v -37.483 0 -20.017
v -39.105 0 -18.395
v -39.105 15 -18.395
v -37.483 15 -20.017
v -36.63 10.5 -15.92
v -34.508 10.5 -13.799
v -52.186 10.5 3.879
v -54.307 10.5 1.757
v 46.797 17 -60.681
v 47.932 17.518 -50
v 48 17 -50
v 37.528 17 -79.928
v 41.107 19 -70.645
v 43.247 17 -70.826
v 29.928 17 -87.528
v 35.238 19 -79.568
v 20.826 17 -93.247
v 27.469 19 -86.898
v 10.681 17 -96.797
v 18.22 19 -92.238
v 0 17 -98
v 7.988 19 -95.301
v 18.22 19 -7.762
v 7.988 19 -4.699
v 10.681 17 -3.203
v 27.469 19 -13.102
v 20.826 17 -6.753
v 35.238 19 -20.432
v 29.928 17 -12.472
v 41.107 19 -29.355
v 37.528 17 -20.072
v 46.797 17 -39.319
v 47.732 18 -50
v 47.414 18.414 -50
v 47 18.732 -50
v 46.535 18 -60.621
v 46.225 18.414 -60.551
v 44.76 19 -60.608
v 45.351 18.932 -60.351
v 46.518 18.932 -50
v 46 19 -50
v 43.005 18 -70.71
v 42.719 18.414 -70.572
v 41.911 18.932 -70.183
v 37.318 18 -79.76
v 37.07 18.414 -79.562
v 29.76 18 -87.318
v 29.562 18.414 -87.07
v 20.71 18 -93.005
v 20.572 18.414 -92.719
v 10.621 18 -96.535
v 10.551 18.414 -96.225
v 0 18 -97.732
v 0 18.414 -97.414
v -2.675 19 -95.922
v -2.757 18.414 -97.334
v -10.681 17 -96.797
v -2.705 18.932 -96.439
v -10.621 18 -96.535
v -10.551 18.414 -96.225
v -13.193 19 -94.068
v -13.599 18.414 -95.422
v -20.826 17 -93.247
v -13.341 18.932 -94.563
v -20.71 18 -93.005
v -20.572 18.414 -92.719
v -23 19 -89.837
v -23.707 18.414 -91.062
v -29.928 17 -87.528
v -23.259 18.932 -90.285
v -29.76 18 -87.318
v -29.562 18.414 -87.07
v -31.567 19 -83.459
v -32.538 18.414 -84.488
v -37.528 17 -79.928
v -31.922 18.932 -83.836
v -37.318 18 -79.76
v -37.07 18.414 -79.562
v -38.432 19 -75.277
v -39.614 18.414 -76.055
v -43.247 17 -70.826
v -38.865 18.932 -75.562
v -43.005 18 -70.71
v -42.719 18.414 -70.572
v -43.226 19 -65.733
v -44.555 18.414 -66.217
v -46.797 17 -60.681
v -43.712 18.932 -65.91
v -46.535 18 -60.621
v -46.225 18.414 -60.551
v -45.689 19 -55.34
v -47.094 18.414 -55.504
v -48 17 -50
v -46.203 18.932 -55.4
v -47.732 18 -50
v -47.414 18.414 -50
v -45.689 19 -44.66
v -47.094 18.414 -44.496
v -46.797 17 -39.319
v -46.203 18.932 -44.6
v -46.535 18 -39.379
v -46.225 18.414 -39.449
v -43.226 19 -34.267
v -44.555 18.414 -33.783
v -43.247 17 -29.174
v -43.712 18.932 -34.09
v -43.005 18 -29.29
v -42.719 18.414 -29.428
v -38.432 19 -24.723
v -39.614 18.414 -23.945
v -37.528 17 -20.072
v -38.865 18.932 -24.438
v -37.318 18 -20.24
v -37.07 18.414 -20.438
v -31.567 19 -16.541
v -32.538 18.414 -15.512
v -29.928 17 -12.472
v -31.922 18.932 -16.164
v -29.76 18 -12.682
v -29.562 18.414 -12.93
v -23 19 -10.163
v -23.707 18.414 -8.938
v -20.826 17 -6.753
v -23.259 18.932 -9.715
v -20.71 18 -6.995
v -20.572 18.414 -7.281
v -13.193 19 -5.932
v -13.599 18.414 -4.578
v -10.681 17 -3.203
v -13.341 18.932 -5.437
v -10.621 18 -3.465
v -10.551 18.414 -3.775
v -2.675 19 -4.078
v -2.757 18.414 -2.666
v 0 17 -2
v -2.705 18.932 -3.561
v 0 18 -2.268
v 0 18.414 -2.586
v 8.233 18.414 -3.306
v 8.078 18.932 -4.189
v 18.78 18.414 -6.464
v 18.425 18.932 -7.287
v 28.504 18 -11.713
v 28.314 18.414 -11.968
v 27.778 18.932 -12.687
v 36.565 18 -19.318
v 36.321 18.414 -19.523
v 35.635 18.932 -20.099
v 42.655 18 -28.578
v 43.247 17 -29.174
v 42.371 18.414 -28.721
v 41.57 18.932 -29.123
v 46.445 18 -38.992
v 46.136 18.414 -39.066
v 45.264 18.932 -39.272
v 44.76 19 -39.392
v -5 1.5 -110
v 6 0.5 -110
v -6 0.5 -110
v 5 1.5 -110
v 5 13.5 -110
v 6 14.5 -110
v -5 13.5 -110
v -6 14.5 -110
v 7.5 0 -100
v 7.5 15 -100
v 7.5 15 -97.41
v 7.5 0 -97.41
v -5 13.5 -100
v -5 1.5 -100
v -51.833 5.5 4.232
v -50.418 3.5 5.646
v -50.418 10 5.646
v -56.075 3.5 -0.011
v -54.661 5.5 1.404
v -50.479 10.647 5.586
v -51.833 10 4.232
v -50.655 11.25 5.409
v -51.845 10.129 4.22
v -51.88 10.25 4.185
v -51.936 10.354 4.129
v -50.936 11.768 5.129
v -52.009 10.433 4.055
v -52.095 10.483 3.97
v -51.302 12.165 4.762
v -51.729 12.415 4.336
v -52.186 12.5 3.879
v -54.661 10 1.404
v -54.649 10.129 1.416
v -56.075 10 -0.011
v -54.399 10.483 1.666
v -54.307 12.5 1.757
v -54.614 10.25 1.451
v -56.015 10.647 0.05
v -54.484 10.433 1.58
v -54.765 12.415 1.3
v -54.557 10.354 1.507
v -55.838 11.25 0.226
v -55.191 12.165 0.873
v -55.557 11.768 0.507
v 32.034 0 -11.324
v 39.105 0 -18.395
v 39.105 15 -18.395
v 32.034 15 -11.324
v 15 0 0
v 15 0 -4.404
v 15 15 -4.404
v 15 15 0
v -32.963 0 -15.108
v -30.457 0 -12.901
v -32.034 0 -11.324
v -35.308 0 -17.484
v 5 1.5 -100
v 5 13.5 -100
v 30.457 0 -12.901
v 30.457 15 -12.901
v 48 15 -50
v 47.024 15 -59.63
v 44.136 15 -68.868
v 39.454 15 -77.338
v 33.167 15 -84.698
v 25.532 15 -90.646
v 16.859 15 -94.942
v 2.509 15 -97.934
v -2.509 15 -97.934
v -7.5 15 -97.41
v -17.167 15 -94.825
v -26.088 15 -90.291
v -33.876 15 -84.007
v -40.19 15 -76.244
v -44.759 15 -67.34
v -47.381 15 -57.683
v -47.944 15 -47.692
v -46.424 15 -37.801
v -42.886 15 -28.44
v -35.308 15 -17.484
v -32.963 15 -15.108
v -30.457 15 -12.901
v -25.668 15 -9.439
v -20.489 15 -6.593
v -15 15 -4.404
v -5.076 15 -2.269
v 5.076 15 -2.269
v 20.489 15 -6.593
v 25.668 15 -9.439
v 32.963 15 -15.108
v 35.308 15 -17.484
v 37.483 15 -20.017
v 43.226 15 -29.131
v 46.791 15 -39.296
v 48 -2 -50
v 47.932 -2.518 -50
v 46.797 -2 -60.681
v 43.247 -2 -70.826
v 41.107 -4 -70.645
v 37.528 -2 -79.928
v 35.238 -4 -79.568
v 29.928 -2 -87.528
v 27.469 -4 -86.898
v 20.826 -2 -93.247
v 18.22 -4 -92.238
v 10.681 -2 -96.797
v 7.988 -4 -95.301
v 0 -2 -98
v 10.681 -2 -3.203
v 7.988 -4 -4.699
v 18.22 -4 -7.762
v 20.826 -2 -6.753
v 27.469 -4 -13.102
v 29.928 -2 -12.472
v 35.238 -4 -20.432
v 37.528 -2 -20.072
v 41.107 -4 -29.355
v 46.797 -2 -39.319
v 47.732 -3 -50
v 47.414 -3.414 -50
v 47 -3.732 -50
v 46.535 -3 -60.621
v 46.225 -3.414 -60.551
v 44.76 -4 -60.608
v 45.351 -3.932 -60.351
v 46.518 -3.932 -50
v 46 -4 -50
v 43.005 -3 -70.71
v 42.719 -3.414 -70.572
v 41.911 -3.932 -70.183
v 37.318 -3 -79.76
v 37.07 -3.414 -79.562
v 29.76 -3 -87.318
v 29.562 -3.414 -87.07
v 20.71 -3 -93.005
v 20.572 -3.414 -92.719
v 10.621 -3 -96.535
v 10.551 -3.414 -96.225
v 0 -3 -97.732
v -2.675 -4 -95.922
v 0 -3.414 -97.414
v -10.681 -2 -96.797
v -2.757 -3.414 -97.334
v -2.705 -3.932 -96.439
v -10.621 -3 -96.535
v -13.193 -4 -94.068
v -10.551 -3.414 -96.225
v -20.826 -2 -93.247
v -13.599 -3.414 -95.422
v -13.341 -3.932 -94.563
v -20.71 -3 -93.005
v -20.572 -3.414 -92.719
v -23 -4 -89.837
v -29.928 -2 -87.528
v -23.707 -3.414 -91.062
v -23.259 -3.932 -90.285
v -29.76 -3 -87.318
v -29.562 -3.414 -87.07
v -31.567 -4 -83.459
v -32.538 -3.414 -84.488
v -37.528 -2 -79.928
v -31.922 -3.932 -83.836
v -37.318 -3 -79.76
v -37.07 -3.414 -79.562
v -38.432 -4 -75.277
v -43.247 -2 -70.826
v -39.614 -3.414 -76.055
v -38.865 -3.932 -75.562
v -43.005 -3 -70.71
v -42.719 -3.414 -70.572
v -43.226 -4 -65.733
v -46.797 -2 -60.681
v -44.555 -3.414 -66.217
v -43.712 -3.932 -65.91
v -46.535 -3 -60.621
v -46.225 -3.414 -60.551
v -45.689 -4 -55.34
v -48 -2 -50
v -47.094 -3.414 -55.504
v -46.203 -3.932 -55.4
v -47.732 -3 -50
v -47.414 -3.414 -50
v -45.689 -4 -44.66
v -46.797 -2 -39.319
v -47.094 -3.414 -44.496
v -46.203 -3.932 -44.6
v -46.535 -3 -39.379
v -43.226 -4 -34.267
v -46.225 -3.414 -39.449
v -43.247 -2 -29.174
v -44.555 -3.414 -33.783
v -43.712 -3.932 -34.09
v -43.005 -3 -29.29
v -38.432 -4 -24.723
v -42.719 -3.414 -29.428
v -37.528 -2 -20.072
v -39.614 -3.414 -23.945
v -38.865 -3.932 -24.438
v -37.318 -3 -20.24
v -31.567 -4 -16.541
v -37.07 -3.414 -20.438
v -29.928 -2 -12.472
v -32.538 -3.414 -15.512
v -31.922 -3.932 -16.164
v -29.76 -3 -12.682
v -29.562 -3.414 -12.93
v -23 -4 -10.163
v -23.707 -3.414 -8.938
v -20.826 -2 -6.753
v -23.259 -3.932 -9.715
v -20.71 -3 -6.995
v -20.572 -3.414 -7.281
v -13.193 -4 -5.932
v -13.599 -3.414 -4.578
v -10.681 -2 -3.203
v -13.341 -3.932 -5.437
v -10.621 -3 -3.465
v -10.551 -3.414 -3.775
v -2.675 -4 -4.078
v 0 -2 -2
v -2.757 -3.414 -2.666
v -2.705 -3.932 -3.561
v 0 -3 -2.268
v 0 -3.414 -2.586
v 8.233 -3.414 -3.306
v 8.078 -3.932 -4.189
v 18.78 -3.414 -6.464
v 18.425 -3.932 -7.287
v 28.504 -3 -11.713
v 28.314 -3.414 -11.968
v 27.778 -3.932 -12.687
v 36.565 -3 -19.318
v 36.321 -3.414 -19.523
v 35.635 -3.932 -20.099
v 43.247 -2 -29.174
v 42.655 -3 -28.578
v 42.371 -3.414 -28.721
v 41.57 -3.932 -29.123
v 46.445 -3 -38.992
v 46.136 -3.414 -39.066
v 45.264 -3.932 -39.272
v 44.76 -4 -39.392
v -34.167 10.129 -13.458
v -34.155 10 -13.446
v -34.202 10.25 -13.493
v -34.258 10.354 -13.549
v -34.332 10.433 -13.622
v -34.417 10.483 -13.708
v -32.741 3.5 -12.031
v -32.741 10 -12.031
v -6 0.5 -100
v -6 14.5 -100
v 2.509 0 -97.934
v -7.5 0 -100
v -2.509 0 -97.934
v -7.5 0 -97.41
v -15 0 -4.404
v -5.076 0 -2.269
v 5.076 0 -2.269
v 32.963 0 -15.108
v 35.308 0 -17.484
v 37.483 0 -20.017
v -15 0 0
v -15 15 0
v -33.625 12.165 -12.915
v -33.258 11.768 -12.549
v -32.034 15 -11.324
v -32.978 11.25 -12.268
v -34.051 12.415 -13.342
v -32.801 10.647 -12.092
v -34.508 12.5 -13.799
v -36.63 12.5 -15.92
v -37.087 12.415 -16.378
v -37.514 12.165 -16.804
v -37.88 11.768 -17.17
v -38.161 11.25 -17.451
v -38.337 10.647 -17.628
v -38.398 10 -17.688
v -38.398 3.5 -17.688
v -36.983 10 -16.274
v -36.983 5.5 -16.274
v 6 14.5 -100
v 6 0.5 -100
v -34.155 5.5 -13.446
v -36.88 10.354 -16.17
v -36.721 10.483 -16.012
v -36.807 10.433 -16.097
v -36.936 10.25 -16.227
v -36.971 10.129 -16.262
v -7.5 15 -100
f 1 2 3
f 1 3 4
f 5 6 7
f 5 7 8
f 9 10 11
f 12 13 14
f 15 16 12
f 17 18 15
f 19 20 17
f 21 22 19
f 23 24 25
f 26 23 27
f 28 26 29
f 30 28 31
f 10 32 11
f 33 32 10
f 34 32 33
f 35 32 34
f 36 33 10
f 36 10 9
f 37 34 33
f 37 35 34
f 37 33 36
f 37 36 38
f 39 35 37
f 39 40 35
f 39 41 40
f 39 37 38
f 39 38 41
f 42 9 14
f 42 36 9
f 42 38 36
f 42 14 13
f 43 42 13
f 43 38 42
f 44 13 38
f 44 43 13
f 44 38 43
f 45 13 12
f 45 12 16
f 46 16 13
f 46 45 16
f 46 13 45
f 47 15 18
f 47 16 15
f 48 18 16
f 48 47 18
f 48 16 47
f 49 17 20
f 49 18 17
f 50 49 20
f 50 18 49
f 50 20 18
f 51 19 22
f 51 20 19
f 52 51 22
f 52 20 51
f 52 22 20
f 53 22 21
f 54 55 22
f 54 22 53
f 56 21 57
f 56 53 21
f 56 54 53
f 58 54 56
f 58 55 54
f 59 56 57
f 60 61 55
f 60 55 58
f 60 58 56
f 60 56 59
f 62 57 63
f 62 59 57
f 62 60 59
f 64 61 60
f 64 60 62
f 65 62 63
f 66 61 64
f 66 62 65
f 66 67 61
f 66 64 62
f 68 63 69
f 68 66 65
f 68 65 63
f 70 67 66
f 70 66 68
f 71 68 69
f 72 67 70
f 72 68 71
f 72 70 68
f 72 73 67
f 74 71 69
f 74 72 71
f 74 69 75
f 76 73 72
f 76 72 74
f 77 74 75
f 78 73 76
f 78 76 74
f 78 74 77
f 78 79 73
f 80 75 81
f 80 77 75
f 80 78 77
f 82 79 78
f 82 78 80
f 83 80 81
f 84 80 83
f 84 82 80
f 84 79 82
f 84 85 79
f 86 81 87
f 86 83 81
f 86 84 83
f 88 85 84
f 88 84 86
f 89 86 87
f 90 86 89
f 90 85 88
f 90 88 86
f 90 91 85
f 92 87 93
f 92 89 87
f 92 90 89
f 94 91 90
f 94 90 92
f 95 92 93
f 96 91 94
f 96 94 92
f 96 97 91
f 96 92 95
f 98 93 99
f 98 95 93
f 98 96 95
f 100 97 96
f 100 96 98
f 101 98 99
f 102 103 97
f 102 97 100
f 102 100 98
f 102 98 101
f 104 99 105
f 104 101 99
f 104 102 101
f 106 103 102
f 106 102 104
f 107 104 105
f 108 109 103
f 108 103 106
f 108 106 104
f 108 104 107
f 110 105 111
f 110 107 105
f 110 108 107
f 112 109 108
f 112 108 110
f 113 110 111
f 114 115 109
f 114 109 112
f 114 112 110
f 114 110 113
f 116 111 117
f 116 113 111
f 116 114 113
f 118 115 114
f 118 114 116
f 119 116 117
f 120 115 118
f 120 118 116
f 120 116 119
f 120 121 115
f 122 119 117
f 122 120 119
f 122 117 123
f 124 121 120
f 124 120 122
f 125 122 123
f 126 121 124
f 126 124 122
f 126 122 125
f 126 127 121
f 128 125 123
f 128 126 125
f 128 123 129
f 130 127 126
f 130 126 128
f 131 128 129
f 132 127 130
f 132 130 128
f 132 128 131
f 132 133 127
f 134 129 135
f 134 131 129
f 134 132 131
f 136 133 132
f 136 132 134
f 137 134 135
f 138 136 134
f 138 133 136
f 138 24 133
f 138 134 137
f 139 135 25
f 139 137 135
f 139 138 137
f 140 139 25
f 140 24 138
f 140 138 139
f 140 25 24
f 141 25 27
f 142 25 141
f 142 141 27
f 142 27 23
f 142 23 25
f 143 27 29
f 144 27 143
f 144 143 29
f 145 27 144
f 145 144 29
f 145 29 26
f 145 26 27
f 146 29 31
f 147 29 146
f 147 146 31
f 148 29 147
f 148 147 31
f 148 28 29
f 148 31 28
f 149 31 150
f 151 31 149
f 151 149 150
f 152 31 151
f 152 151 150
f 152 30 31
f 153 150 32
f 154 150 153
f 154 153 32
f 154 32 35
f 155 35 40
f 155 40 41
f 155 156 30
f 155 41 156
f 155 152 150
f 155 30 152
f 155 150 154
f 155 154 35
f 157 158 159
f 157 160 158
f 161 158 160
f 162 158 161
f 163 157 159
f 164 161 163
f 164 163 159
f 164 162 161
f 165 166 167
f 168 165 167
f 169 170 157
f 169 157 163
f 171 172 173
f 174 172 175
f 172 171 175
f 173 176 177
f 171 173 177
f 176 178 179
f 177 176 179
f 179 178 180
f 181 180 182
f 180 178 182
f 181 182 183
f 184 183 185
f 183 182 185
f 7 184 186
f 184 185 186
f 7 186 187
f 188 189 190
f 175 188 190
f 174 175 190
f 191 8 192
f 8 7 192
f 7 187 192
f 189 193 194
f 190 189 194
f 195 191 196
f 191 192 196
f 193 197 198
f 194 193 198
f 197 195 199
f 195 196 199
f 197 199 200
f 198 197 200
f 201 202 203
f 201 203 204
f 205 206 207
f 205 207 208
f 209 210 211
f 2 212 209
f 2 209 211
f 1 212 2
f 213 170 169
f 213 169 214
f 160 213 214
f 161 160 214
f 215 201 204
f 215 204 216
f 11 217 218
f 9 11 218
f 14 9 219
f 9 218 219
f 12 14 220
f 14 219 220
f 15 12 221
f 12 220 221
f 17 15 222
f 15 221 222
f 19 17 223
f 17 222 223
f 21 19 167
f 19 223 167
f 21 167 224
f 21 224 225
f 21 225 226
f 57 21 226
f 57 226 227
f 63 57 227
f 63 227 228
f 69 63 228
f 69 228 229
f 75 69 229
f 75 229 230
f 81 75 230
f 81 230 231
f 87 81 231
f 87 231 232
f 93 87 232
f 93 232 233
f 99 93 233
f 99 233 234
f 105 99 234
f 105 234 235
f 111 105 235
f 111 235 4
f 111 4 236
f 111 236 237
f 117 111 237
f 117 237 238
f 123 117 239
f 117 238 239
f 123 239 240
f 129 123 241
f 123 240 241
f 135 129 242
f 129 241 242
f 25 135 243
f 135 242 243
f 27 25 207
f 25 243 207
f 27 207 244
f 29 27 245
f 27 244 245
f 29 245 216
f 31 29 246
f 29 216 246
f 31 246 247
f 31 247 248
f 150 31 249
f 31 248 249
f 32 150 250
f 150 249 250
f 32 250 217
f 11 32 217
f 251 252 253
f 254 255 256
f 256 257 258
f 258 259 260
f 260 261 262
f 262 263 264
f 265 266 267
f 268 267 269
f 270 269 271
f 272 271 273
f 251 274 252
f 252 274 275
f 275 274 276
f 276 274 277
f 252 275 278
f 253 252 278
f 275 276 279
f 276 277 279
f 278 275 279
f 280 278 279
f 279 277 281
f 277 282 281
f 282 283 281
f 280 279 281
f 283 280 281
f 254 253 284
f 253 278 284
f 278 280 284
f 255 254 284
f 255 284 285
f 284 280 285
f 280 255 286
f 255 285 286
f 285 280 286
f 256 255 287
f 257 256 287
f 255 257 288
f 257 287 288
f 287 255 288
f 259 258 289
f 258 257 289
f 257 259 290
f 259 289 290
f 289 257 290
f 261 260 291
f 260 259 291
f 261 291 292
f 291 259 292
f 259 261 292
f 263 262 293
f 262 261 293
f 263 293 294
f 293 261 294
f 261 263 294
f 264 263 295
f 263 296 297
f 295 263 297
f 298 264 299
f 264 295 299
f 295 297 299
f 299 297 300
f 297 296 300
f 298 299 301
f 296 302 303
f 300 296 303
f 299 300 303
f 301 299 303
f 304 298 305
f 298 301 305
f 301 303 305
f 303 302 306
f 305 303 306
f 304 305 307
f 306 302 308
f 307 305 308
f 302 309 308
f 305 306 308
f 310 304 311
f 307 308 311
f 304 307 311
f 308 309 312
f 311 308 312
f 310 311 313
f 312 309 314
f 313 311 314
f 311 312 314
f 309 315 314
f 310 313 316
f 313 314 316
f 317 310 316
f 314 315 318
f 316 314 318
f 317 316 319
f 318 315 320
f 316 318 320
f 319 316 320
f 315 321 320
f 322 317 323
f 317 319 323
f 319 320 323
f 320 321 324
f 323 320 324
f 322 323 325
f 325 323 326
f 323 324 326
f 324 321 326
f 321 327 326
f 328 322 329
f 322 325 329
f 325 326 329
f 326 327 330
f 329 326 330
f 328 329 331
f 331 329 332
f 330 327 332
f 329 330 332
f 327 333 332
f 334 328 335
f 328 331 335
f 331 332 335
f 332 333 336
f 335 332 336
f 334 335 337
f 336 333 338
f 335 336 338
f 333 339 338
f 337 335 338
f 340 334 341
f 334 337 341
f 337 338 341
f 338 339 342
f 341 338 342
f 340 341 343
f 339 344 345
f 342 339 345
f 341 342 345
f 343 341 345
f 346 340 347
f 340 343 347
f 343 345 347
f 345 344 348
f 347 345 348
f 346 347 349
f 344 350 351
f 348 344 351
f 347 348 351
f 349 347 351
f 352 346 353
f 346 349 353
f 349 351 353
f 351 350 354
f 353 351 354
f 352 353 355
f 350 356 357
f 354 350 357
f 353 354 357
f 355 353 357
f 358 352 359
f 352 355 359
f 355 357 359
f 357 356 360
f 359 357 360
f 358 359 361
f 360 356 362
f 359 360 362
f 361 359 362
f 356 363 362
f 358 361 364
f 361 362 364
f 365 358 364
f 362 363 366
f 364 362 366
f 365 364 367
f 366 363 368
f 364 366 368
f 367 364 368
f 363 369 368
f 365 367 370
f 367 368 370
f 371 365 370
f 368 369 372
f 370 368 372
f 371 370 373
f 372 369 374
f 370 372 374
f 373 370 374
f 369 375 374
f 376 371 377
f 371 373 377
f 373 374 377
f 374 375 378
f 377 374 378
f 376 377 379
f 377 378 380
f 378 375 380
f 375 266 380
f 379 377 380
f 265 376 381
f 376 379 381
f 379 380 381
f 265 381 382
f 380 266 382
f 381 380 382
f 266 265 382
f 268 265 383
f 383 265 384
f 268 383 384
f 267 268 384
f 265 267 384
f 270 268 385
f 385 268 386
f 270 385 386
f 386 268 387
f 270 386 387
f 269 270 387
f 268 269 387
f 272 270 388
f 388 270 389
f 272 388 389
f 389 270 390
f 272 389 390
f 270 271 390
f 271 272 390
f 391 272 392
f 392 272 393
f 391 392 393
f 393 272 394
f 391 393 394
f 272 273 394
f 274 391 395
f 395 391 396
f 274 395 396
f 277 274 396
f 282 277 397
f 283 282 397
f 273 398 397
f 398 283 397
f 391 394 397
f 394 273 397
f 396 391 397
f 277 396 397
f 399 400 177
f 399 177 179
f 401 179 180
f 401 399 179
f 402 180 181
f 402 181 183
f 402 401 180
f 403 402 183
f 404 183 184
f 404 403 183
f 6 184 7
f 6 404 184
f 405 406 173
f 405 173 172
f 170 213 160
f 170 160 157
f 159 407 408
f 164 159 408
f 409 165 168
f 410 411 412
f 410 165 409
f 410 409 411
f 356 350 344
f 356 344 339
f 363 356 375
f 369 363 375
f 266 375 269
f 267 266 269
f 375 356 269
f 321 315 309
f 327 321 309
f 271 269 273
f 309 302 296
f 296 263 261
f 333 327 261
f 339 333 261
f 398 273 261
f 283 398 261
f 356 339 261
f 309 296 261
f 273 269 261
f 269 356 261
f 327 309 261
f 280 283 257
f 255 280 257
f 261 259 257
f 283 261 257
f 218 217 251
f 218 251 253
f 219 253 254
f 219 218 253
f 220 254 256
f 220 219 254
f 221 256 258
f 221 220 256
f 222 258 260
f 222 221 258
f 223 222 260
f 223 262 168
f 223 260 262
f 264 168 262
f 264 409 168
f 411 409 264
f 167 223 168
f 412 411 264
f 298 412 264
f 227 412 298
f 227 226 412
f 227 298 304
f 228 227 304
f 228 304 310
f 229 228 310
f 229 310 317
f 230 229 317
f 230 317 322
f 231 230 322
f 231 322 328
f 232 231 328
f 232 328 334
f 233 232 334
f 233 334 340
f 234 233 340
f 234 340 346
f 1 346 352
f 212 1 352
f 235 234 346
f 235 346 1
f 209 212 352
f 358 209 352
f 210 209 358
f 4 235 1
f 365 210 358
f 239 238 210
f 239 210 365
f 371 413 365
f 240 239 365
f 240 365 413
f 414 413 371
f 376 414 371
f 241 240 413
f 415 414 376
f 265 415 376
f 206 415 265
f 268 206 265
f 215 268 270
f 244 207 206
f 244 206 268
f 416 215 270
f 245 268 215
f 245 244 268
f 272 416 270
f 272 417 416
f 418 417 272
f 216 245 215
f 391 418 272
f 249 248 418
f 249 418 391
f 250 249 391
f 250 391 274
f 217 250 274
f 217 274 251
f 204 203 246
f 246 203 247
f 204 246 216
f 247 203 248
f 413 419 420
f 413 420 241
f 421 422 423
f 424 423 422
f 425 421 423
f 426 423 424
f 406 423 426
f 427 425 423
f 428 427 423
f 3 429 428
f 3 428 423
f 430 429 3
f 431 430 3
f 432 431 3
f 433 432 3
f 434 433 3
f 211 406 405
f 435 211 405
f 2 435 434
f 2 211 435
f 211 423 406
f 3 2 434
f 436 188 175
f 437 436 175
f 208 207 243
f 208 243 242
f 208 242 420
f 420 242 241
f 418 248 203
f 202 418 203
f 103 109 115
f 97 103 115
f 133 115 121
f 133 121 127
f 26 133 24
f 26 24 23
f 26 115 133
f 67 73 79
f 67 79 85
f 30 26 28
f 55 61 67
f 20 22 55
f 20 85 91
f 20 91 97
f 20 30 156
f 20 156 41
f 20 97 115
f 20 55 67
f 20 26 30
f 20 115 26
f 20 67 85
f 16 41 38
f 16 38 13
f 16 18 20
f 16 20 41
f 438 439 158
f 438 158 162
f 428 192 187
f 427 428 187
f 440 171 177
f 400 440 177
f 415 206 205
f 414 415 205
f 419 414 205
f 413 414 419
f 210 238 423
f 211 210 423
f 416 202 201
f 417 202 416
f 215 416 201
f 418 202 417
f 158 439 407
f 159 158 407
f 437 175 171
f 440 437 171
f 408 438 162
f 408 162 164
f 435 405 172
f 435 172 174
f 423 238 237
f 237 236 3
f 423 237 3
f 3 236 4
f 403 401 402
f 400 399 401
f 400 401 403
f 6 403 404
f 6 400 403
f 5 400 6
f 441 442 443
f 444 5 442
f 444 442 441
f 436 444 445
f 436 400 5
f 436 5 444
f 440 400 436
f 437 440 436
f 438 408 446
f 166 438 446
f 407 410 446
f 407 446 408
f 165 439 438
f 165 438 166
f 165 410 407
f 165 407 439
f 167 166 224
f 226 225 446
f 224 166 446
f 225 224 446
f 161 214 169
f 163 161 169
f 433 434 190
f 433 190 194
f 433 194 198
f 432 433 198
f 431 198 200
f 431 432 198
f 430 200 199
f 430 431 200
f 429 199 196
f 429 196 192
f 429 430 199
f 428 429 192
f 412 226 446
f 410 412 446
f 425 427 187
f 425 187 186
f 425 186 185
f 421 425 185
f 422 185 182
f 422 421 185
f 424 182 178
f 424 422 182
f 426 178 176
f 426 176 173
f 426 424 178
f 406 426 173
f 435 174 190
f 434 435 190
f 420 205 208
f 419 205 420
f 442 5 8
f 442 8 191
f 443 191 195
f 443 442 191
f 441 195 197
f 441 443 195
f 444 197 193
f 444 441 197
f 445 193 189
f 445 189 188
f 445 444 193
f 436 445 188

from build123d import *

# Parameters (mm, degrees)
EXTRUSION1_DEPTH      = 15
ESQUISSE2_R           = 48
EXTRUSION2_DEPTH      = 4
EXTRUSION2_DEPTH_BACK = 19
CONG_1_R              = 2
EXTRUSION5_DEPTH      = 25
ESQUISSE6_W           = 12
ESQUISSE6_H           = 14
ESQUISSE6_W_2         = 10
ESQUISSE6_H_2         = 12
EXTRUSION6_DEPTH      = 10


with BuildPart() as part:
    # Esquisse1 → Extrusion1 (new body)
    with BuildSketch(Plane(origin=(0, 0, 0), x_dir=(1, 0, 0), z_dir=(0, 1, 0))):
        Polygon((-7.5, 100), (7.5, 100), (7.5, 50), (39.104688576, 18.395311424), (32.033620764, 11.324243612), (15, 28.357864376), (15, 0), (-15, 0), (-15, 28.357864376), (-32.033620764, 11.324243612), (-39.104688576, 18.395311424), (-7.5, 50), align=None)
    extrude(amount=EXTRUSION1_DEPTH)

    # Esquisse2 → Extrusion2 (add, two sides)
    with BuildSketch(Plane(origin=(0, 15, 0), x_dir=(1, 0, 0), z_dir=(0, 1, 0))) as extrusion2_sk:
        with Locations((0, 50)):
            Circle(ESQUISSE2_R)
    extrude(amount=EXTRUSION2_DEPTH)
    extrude(extrusion2_sk.sketch, amount=-EXTRUSION2_DEPTH_BACK)

    # Congé1
    cong_1_edges = [part.edges().sort_by_distance(p)[0] for p in [
        (-48, -4, -50),
        (-48, 19, -50),
    ]]
    fillet(cong_1_edges, radius=CONG_1_R)

    # Esquisse5 → Extrusion5 (add)
    with BuildSketch(Plane(origin=(-10.354688576, 0, 10.354688576), x_dir=(0.707106781, 0, 0.707106781), z_dir=(-0.707106781, 0, 0.707106781))):
        with BuildLine():
            Line((-39.658639918, 3.5), (-39.658639918, 10))
            ThreePointArc((-39.658639918, 10), (-38.926406871, 11.767766953), (-37.158639918, 12.5))
            Line((-37.158639918, 12.5), (-34.158639918, 12.5))
            ThreePointArc((-34.158639918, 12.5), (-32.390872965, 11.767766953), (-31.658639918, 10))
            Line((-31.658639918, 10), (-31.658639918, 3.5))
            Line((-31.658639918, 3.5), (-39.658639918, 3.5))
        make_face()
        with BuildLine():
            Line((-37.658639918, 10), (-37.658639918, 5.5))
            Line((-37.658639918, 5.5), (-33.658639918, 5.5))
            Line((-33.658639918, 5.5), (-33.658639918, 10))
            ThreePointArc((-33.658639918, 10), (-33.805086528, 10.353553391), (-34.158639918, 10.5))
            Line((-34.158639918, 10.5), (-37.158639918, 10.5))
            ThreePointArc((-37.158639918, 10.5), (-37.512193309, 10.353553391), (-37.658639918, 10))
        make_face(mode=Mode.SUBTRACT)
    extrude(amount=EXTRUSION5_DEPTH)

    # Esquisse6 → Extrusion6 (add)
    with BuildSketch(Plane(origin=(0, 0, -100), x_dir=(-1, 0, 0), z_dir=(0, 0, -1))):
        with Locations((0, 7.5)):
            Rectangle(ESQUISSE6_W, ESQUISSE6_H)
        with Locations((0, 7.5)):
            Rectangle(ESQUISSE6_W_2, ESQUISSE6_H_2, mode=Mode.SUBTRACT)
    extrude(amount=EXTRUSION6_DEPTH)


solid = part.part
